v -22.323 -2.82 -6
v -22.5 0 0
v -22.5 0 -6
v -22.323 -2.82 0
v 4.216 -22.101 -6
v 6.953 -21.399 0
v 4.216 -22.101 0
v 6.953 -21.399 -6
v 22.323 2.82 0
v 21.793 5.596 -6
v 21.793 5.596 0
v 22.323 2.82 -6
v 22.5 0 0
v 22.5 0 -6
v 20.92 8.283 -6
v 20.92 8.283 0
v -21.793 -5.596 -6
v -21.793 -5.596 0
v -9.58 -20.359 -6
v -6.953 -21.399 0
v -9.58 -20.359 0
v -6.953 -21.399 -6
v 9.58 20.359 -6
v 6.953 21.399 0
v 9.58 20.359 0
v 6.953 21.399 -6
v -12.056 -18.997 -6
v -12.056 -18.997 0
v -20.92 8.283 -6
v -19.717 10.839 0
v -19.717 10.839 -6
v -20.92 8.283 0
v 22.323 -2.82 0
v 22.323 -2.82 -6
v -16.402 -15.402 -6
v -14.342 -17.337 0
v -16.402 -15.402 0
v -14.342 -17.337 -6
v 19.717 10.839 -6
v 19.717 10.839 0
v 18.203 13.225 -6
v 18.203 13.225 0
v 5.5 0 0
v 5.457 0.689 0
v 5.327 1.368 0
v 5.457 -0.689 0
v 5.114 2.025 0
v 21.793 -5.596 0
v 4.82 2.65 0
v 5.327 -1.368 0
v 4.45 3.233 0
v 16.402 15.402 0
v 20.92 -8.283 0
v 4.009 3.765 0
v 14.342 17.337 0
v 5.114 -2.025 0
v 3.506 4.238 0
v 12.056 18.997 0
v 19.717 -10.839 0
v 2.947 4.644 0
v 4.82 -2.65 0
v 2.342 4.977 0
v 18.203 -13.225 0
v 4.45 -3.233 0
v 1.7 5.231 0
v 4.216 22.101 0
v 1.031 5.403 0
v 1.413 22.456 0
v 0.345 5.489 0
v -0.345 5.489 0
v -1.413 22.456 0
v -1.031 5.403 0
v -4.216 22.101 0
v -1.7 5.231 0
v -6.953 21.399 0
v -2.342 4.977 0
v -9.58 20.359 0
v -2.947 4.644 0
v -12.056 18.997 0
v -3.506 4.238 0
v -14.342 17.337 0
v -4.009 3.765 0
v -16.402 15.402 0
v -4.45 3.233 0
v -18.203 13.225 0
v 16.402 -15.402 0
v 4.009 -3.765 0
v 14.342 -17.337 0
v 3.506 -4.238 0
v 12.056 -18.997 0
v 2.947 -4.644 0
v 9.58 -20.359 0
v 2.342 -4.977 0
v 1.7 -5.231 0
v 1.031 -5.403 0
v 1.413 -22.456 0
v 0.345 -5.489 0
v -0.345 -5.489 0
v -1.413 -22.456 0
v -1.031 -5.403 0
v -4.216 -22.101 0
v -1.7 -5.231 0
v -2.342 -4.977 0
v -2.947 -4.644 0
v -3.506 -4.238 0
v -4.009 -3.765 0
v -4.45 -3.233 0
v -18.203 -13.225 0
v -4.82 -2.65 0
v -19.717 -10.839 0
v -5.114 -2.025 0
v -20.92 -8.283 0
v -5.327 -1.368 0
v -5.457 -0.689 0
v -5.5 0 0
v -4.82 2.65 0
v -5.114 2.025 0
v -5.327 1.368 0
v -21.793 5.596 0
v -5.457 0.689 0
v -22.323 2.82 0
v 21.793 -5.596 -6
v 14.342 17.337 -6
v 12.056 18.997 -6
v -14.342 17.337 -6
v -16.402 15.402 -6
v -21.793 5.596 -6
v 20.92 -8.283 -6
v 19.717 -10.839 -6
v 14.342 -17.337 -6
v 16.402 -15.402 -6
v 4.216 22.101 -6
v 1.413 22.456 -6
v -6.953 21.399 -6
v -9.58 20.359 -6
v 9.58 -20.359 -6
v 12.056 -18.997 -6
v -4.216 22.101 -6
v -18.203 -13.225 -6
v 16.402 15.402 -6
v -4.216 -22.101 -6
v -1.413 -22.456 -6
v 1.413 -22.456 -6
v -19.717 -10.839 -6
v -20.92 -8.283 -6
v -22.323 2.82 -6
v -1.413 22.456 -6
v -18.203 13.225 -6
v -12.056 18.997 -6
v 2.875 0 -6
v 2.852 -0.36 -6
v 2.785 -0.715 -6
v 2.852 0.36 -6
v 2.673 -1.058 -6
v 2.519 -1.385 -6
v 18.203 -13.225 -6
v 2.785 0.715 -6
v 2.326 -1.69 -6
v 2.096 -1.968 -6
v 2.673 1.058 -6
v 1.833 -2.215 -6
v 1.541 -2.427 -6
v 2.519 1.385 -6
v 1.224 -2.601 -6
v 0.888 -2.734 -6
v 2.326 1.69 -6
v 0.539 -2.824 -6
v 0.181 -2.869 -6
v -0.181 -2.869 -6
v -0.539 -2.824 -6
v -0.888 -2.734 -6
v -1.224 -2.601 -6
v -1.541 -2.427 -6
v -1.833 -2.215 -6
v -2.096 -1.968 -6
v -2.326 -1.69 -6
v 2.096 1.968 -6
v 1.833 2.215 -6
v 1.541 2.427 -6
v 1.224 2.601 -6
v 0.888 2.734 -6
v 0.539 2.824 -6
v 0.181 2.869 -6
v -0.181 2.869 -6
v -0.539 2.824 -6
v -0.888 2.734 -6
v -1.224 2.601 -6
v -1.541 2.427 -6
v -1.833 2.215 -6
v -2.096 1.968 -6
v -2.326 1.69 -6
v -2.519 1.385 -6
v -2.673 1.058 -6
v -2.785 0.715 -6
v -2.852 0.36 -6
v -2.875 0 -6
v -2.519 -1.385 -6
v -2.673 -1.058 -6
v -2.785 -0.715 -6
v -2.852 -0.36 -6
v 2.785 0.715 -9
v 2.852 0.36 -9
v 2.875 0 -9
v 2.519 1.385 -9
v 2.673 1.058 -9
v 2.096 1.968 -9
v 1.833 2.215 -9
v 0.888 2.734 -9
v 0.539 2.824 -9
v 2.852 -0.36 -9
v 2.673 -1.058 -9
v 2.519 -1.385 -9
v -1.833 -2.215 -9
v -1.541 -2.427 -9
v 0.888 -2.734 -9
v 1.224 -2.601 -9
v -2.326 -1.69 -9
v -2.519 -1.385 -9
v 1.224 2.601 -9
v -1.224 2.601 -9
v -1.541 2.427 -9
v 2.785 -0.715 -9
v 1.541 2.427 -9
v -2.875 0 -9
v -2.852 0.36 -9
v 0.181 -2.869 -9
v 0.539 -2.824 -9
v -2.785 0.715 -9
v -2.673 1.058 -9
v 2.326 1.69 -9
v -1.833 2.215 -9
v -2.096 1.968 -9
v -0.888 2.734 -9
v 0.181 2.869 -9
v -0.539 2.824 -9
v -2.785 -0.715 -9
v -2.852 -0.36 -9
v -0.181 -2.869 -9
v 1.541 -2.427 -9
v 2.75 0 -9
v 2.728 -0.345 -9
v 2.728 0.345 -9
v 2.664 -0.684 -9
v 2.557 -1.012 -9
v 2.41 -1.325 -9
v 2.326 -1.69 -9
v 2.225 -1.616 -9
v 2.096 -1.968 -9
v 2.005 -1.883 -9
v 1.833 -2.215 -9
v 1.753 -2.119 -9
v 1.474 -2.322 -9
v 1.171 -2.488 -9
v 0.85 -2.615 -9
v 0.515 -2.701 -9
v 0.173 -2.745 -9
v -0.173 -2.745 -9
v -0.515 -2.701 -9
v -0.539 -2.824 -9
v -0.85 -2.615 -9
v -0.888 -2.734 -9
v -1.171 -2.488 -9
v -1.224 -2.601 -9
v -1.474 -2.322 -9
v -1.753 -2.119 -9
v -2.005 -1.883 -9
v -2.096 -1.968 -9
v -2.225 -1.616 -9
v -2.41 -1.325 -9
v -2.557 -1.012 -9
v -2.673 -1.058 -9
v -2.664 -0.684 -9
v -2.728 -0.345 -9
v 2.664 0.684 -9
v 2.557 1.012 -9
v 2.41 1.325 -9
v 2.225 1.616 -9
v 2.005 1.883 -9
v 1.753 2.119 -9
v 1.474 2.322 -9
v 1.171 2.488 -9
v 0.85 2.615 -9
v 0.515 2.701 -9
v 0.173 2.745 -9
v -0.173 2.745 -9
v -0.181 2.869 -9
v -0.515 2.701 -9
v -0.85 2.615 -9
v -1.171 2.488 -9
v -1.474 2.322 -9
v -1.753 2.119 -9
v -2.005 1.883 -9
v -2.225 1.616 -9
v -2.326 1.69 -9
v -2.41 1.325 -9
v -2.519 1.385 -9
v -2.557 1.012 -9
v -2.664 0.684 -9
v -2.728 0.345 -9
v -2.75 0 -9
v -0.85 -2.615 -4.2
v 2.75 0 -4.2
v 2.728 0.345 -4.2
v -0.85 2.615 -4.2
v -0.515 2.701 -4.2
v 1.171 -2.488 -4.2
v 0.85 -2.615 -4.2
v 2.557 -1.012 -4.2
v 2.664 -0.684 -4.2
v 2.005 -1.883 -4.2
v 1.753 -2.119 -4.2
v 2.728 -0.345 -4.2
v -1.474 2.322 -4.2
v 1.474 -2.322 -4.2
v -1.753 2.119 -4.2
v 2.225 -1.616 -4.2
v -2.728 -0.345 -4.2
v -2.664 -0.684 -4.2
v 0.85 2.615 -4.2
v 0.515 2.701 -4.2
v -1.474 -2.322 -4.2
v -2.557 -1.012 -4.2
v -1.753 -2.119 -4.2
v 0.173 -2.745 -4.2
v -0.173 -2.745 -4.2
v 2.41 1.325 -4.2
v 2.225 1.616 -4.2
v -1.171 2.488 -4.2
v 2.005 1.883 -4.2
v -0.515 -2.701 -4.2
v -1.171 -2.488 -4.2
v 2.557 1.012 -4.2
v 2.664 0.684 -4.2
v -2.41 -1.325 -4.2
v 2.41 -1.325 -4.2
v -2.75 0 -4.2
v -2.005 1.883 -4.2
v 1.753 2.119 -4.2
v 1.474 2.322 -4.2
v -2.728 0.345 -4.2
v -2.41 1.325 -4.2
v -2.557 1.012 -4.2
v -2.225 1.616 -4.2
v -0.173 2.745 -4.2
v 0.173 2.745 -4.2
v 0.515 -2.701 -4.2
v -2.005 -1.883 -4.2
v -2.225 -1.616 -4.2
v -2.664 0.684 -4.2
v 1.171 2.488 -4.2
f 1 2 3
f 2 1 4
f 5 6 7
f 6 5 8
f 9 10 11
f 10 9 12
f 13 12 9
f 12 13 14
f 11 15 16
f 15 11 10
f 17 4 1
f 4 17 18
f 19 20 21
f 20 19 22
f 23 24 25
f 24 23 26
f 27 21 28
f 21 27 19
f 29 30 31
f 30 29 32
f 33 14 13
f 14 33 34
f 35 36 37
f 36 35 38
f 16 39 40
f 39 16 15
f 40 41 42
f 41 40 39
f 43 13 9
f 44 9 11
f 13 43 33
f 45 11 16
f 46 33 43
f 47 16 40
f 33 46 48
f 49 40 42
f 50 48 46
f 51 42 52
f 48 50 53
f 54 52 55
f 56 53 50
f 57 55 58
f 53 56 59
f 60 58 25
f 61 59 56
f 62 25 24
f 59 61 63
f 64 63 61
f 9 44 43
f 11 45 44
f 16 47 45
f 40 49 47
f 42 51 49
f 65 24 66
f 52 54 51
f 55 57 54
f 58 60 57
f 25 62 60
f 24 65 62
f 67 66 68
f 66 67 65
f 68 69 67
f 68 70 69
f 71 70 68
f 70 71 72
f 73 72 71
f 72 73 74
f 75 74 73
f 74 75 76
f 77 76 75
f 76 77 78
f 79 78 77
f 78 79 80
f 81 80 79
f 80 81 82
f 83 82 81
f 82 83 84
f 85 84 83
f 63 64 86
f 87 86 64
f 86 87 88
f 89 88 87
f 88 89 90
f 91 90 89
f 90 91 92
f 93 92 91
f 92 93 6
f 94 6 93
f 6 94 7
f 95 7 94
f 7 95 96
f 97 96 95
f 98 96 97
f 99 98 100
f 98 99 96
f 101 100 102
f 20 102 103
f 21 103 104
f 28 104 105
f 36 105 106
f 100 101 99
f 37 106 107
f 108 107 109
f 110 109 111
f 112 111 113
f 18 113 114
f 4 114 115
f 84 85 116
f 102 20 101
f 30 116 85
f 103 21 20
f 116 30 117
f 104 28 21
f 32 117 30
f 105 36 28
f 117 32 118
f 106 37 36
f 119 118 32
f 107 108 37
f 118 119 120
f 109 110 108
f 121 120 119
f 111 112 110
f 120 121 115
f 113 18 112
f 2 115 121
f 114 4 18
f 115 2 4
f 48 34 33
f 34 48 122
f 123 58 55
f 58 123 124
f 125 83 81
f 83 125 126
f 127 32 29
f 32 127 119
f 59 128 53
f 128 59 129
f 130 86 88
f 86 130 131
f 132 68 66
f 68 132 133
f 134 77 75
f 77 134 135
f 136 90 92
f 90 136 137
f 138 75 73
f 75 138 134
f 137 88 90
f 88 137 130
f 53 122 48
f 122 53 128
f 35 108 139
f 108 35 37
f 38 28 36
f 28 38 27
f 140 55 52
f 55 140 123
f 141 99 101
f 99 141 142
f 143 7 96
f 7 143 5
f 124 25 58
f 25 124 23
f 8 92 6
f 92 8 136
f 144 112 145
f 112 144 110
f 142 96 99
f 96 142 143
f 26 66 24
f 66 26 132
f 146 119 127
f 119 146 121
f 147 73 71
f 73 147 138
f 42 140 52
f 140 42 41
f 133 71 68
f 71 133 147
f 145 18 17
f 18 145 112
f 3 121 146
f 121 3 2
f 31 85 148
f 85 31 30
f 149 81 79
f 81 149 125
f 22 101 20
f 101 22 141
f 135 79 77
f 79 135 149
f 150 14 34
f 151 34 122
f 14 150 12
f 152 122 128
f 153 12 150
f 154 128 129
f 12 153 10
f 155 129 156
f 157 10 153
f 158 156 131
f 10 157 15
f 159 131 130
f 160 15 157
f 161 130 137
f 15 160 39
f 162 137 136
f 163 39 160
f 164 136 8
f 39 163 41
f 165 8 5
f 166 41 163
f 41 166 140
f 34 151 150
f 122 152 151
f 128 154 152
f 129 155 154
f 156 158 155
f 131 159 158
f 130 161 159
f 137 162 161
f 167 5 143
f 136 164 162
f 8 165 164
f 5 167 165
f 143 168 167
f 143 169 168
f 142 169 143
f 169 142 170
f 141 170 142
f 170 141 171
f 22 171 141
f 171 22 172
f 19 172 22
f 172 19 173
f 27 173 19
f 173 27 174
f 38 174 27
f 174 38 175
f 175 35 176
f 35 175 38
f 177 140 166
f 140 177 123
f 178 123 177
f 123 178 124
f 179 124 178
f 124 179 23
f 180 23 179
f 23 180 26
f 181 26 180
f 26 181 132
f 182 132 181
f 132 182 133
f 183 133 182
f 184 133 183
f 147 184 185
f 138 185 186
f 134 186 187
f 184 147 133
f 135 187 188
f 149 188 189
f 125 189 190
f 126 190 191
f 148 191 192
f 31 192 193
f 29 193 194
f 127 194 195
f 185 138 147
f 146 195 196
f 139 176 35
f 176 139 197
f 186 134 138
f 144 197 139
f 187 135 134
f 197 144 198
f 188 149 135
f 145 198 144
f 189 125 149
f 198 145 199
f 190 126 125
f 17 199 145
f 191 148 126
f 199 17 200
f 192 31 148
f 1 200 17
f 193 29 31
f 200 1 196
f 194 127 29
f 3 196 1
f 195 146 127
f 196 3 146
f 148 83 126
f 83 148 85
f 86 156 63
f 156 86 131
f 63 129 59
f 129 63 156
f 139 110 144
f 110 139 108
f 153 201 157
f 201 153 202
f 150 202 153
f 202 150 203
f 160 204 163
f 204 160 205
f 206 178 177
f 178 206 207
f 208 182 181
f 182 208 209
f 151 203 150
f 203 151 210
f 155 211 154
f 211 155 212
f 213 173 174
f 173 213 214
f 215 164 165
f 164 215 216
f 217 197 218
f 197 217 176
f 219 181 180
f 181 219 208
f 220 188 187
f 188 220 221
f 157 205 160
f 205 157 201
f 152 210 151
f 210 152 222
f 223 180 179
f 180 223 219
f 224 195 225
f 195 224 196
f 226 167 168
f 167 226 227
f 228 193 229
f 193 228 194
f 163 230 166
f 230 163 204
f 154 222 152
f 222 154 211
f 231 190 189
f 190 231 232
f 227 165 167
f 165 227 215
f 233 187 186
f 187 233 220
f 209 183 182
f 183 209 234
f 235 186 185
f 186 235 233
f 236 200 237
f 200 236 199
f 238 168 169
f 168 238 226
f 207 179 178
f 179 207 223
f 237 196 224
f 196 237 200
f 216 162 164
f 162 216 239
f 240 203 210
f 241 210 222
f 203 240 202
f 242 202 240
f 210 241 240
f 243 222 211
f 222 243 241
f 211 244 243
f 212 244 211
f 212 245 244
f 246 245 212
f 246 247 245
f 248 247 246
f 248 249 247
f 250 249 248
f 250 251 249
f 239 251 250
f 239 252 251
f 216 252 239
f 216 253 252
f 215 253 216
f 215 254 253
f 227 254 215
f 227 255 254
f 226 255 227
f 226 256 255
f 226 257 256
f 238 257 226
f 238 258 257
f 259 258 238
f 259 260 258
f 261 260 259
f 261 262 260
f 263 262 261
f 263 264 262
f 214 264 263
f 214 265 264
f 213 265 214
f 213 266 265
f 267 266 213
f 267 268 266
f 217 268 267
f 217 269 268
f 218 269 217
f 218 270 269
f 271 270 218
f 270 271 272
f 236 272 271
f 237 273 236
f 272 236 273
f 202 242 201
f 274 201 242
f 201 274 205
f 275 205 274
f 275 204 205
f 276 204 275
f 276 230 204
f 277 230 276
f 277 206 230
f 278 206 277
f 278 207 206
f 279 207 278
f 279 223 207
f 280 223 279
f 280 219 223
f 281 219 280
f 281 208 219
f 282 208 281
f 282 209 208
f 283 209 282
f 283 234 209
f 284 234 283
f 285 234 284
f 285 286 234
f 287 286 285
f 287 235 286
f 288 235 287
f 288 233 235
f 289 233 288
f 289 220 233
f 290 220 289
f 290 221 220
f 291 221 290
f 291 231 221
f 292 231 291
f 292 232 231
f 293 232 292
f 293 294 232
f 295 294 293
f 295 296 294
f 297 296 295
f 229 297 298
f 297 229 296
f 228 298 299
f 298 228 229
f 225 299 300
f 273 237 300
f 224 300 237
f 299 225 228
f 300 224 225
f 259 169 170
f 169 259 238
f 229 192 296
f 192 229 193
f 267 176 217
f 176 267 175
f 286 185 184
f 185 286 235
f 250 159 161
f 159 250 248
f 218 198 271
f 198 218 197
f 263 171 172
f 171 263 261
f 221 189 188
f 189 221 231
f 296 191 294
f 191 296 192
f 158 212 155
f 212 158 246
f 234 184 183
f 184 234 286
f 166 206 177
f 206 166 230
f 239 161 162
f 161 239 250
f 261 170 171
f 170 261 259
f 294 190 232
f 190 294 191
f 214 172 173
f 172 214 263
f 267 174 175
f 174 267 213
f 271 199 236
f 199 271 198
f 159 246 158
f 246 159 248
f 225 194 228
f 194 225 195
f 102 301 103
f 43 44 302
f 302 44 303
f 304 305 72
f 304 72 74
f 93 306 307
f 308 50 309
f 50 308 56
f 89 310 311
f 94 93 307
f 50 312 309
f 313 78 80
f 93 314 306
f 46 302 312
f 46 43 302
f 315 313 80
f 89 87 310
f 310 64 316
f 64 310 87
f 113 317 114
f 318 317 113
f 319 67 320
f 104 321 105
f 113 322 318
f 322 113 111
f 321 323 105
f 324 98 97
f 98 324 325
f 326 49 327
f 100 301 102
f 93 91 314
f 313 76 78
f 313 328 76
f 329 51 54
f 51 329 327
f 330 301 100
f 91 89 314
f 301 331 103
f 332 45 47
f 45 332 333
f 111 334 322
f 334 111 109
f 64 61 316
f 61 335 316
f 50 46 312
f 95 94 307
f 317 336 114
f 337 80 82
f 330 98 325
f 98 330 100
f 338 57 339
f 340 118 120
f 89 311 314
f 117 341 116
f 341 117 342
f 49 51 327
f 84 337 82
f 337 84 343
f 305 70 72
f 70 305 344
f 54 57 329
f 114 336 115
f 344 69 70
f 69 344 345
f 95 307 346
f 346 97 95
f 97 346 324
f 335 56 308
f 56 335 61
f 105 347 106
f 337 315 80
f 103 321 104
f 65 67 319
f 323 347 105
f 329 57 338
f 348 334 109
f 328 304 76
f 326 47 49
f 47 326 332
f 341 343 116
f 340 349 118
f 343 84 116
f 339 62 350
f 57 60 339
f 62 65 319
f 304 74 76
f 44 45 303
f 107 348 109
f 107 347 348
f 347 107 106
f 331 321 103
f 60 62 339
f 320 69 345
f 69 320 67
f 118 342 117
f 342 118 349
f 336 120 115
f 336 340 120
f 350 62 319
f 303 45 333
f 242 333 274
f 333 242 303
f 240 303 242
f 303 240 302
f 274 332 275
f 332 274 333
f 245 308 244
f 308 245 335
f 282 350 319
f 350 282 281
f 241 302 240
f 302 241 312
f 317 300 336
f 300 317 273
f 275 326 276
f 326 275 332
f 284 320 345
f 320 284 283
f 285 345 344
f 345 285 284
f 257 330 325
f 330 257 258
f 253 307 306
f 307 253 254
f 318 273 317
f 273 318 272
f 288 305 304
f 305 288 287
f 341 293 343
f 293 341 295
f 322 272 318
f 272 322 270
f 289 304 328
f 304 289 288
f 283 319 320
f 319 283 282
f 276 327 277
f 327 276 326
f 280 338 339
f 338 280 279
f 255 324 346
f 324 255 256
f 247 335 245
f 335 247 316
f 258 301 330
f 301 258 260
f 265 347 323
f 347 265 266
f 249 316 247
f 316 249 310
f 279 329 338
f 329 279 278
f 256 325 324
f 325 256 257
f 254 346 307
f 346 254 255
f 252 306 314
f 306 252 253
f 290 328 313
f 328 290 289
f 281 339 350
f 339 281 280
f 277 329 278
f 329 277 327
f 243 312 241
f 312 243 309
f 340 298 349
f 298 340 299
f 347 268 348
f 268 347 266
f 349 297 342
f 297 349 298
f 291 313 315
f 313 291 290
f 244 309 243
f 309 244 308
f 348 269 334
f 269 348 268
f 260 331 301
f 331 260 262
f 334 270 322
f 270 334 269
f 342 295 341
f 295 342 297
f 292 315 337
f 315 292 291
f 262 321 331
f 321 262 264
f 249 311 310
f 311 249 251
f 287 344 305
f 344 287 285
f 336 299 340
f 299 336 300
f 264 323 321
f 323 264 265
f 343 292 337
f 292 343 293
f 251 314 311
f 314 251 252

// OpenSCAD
$fn = 50;


difference() {
	union() {
		translate(v = [0, 0, -6.0000000000]) {
			cylinder(h = 6, r = 22.5000000000);
		}
		#translate(v = [0, 0, -9.0000000000]) {
			cylinder(h = 9, r = 2.8750000000);
		}
	}
	union() {
		translate(v = [0, 0, 0]) {
			rotate(a = [0, 0, 0]) {
				difference() {
					union() {
						translate(v = [0, 0, -9.0000000000]) {
							cylinder(h = 9, r = 2.2500000000);
						}
						translate(v = [0, 0, -4.2000000000]) {
							cylinder(h = 4.2000000000, r1 = 2.7500000000, r2 = 5.5000000000);
						}
						translate(v = [0, 0, -9.0000000000]) {
							cylinder(h = 9, r = 2.7500000000);
						}
						translate(v = [0, 0, -9.0000000000]) {
							cylinder(h = 9, r = 2.2500000000);
						}
					}
					union();
				}
			}
		}
	}
}
